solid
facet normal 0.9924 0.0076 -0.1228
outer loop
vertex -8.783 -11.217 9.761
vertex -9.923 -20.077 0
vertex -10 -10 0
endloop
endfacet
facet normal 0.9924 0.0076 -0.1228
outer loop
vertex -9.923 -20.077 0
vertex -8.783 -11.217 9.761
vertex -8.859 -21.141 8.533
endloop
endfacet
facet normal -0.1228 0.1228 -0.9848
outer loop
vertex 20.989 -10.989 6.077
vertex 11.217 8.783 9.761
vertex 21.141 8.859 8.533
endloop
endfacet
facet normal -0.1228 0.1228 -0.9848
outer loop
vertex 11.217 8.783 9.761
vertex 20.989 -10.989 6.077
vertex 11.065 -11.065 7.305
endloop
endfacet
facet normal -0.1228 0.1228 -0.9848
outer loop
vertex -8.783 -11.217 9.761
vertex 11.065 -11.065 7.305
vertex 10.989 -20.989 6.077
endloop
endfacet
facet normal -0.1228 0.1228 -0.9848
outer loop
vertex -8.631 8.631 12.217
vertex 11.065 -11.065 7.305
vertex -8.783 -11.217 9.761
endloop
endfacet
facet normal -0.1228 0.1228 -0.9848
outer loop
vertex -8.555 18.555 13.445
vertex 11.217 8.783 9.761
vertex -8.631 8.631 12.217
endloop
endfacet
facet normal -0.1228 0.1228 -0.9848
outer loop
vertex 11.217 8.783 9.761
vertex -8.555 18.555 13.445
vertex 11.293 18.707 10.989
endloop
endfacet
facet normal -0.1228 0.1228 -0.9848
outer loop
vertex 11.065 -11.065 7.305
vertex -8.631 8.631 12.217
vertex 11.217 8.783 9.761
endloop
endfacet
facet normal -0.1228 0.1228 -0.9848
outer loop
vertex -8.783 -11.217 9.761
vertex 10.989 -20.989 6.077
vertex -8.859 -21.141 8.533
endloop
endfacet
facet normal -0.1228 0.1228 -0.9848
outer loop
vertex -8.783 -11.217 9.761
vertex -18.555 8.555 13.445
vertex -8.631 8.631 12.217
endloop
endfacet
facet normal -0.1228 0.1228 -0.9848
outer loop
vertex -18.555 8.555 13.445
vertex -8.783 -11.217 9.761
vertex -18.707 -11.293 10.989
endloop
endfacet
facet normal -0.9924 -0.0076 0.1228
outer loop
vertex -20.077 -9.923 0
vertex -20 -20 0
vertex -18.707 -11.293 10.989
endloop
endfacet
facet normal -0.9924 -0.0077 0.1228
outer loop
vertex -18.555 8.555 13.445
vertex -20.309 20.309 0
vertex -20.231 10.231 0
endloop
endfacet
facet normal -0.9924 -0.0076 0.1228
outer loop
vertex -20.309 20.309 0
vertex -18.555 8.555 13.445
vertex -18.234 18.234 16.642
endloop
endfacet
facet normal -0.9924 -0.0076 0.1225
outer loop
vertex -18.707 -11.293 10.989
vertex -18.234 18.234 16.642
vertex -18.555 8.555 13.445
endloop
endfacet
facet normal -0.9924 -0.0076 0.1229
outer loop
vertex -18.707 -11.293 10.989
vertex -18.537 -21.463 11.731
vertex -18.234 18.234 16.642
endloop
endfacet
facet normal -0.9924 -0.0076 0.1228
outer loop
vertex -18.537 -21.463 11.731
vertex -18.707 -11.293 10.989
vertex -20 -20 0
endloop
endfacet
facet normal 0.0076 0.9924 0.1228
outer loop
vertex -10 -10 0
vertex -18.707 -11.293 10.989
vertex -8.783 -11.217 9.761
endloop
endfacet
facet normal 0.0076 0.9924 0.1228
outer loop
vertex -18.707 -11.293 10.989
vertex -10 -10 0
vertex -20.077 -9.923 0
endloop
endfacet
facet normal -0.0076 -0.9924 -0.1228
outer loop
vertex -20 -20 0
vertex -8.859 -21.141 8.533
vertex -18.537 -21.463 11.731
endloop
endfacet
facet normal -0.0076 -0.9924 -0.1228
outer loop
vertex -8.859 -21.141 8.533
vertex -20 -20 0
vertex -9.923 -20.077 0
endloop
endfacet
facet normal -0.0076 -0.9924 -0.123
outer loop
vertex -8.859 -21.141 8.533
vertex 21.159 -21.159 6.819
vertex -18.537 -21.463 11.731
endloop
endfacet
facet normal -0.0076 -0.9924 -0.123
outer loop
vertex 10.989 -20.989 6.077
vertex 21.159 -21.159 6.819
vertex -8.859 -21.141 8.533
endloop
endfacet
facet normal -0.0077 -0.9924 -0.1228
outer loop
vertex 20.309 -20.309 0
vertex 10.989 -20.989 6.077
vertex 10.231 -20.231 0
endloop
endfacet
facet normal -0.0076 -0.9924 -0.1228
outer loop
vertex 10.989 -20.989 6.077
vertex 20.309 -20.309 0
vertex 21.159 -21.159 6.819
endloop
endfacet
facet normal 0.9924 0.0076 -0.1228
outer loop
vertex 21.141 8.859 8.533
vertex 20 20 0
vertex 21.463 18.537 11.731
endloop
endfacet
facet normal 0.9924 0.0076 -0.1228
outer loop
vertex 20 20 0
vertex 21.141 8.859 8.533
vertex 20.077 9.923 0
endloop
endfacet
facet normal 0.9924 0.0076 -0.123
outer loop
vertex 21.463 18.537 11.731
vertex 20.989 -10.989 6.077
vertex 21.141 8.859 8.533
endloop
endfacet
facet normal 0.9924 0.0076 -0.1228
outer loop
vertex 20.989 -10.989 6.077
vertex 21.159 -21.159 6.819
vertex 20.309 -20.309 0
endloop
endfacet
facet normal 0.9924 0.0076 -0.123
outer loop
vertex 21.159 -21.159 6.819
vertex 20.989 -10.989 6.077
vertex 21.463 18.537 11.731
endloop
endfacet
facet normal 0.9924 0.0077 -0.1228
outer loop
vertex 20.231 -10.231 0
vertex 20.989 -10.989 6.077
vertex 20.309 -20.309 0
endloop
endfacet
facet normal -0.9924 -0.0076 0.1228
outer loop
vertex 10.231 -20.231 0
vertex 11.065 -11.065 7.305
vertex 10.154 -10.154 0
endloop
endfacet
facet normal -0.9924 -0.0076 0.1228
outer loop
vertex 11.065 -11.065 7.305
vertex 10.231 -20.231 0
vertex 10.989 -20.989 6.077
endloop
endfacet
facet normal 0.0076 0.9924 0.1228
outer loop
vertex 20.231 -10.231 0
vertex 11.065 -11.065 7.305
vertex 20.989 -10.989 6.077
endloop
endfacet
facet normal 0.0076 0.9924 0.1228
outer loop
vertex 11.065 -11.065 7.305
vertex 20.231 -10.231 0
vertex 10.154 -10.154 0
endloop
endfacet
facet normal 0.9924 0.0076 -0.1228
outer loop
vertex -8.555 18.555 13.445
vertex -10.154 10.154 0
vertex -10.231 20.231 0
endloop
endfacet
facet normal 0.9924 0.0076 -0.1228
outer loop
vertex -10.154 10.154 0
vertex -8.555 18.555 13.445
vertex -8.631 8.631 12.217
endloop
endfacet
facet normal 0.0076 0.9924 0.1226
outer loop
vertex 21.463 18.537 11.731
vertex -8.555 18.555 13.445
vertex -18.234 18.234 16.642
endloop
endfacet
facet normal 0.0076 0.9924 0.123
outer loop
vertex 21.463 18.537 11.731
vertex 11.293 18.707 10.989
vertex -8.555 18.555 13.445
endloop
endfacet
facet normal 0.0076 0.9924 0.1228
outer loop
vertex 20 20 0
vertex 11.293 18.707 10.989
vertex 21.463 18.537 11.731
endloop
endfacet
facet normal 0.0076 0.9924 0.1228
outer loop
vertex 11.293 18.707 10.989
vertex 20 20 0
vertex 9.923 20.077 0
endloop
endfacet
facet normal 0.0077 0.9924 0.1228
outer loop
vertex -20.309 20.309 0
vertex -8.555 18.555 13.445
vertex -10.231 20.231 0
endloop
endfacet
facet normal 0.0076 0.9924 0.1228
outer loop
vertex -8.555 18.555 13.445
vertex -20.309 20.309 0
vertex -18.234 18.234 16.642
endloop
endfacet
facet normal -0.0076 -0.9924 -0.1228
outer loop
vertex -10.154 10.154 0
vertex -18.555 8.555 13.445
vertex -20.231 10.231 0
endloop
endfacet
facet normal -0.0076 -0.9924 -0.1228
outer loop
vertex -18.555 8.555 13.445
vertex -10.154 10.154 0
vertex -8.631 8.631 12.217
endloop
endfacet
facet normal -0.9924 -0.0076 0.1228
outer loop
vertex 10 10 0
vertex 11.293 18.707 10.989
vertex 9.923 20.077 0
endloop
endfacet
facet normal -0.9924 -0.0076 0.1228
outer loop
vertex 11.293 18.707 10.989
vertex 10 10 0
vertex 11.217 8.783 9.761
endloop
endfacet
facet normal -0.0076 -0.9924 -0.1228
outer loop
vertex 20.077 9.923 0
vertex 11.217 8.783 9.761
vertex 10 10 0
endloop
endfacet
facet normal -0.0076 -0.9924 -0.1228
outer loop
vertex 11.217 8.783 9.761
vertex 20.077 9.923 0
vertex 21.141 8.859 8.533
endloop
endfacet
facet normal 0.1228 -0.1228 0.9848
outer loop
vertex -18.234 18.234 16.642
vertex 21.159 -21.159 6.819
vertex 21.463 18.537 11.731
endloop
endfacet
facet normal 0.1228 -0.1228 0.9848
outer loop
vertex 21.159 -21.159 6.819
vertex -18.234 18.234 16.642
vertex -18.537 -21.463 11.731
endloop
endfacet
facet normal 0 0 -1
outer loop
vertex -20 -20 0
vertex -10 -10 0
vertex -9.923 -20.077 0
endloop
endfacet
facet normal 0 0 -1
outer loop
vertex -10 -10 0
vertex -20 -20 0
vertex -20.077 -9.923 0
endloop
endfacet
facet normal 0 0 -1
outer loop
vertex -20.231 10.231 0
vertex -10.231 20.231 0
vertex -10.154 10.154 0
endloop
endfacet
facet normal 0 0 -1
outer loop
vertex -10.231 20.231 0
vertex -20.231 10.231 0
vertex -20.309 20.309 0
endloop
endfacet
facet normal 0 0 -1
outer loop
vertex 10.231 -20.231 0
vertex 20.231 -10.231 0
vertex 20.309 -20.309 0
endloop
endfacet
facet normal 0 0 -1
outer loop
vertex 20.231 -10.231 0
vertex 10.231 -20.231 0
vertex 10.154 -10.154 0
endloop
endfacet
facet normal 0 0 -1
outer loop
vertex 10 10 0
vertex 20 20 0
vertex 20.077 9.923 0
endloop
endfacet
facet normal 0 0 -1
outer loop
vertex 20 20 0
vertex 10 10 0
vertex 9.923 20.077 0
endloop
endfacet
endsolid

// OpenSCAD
delta=20;
width=10;
tilt_angle=10;

height=[5+(2*width+delta)*sqrt(2)*sin(tilt_angle)/2, 2];

difference()
{
		
	rotate(tilt_angle,[1,1,0])
	{
		

	union()
	{
		for (j = [-1:2:1])
		{
			for (i = [-1:2:1])
			{
				translate([i*delta/2+i*width/2-width/2,j*delta/2+j*width/2-width/2,-100])
					cube([width,width,height[0]+100]);
			}
		}
	}

	translate([0,0,height[0]+height[1]/2])
		cube([delta+2*width,delta+2*width,height[1]], center=true);

	}

	translate([-500,-500,-1000])
		cube(1000);
}
